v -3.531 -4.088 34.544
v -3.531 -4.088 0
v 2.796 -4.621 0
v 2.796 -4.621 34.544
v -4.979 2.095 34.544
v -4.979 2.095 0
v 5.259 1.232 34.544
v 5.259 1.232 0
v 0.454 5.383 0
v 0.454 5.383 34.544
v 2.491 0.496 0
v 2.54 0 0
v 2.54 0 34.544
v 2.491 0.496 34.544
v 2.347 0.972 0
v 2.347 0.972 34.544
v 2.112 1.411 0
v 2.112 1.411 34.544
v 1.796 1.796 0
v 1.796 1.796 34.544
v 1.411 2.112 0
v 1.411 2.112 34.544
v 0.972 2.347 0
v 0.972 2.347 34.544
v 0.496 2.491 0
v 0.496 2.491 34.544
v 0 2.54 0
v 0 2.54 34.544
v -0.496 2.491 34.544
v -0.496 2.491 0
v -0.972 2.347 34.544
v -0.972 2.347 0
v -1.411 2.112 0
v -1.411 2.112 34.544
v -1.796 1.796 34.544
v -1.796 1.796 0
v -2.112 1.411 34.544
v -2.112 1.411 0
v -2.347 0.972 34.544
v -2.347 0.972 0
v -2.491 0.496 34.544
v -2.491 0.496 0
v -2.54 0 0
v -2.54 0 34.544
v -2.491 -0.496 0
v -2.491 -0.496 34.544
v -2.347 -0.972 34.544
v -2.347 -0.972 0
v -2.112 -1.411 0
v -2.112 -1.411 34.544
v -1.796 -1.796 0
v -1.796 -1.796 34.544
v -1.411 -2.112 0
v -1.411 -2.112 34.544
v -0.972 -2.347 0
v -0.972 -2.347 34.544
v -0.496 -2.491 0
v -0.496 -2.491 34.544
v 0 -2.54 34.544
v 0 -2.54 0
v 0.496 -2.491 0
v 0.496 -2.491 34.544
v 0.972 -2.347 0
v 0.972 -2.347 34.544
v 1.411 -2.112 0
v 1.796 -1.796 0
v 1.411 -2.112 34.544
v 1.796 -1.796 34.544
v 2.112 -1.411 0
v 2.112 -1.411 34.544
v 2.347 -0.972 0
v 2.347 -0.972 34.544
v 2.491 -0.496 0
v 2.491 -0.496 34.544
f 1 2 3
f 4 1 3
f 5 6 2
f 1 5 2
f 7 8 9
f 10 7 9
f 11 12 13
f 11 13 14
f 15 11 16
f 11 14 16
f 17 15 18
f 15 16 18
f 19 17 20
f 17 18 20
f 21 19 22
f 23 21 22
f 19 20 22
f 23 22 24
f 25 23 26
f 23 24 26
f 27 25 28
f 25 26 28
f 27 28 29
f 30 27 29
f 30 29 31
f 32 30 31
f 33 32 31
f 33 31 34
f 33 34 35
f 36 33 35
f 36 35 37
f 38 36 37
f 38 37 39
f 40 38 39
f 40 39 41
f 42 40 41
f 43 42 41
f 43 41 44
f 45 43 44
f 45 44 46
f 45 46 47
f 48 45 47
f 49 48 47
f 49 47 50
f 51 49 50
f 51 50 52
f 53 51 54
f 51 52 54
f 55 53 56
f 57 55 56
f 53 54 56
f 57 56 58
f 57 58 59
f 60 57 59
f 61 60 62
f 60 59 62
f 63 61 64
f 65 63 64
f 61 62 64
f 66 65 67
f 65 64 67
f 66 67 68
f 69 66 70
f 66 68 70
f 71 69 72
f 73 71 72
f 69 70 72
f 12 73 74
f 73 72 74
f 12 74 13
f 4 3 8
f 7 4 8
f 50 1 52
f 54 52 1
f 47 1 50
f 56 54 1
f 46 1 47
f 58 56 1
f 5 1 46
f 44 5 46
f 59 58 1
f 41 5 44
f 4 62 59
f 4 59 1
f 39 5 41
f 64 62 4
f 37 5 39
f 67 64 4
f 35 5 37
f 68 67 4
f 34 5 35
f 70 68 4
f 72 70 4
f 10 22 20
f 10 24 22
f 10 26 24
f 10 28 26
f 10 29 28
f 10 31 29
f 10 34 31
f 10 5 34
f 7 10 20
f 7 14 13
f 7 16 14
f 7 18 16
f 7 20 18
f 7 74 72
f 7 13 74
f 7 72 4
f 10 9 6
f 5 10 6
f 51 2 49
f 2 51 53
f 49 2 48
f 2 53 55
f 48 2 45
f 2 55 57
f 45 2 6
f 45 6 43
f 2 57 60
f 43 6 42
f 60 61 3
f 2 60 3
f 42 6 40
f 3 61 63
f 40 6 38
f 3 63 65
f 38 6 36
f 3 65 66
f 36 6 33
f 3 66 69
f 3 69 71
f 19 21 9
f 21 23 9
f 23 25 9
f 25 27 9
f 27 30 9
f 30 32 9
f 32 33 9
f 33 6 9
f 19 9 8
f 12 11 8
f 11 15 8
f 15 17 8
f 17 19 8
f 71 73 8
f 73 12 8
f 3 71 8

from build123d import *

# Parameters (mm, degrees)
F1_DEPTH = 34.544
F2_R     = 2.54
F3_DEPTH = 34.545


with BuildPart() as f1:
    # F0 (on Top) → F1 (new body)
    with BuildSketch(Plane.XY):
        Polygon((5.259377, 1.2315), (0.45401, 5.382519), (-4.978783, 2.095079), (-3.531067, -4.087689), (2.796463, -4.62141), align=None)
    extrude(amount=F1_DEPTH)

    # F2 (on face) → F3 (cut, through all)
    with BuildSketch(Plane.XY.offset(34.544)):
        Circle(F2_R)
    extrude(amount=-F3_DEPTH, mode=Mode.SUBTRACT)


solid = f1.part
